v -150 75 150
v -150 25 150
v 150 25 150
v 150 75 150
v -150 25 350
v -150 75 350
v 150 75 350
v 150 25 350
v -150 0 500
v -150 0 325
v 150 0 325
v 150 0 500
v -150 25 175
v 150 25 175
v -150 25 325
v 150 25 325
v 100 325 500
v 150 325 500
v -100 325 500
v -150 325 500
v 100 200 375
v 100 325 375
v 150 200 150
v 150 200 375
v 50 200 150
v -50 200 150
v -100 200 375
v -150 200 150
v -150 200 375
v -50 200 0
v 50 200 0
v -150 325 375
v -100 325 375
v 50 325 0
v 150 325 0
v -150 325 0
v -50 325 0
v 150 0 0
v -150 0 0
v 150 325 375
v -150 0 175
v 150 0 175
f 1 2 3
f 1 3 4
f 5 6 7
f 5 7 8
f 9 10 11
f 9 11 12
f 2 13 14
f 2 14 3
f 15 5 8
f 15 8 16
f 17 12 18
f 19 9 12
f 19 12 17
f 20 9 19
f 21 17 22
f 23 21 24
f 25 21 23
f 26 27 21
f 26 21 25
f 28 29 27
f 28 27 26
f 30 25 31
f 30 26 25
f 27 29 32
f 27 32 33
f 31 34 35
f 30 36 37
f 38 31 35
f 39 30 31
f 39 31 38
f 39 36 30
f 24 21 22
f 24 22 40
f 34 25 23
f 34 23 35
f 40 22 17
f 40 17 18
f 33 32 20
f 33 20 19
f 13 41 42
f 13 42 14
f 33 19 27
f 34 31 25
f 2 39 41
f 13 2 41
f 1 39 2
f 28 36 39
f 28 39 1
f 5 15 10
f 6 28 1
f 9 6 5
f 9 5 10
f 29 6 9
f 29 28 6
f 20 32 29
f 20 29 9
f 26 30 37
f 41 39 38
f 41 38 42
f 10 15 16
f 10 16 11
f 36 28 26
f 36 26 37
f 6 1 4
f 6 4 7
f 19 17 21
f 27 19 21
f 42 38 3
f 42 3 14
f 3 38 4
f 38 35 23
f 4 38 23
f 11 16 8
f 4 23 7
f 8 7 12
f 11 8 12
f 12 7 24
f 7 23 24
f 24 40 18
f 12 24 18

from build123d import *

# Parameters (mm, degrees)
BOSS_EXTRUDE1_DEPTH      = 150
BOSS_EXTRUDE1_DEPTH_BACK = 150
SKETCH3_W                = 50
SKETCH3_H                = 125
BOSS_EXTRUDE2_DEPTH      = 125
SKETCH4_W                = 100
SKETCH4_H                = 125
CUT_EXTRUDE1_DEPTH       = 230


with BuildPart() as part:
    # Sketch1 → Boss-Extrude1 (new, two sides: drawn at the far end of the back side and taken through both)
    with BuildSketch(Plane(origin=(0, 0, 0), x_dir=(0, 0, -1), z_dir=(1, 0, 0)).offset(-BOSS_EXTRUDE1_DEPTH_BACK)):
        Polygon((0, 0), (-175, 0), (-175, 25), (-150, 25), (-150, 75), (-350, 75), (-350, 25), (-325, 25), (-325, 0), (-500, 0), (-500, 325), (-375, 200), (-150, 200), (0, 325), align=None)
    extrude(amount=BOSS_EXTRUDE1_DEPTH + BOSS_EXTRUDE1_DEPTH_BACK)

    # Sketch3 → Boss-Extrude2 (add)
    with BuildSketch(Plane(origin=(0, 200, 0), x_dir=(1, 0, 0), z_dir=(0, 1, 0))):
        with Locations((125, -437.5)):
            Rectangle(SKETCH3_W, SKETCH3_H)
        with Locations((-125, -437.5)):
            Rectangle(SKETCH3_W, SKETCH3_H)
    extrude(amount=BOSS_EXTRUDE2_DEPTH)

    # Sketch4 → Cut-Extrude1 (cut)
    with BuildSketch(Plane(origin=(0, 0, 0), x_dir=(-1, 0, 0), z_dir=(0, 0, -1))):
        with Locations((0, 262.5)):
            Rectangle(SKETCH4_W, SKETCH4_H)
    extrude(amount=-CUT_EXTRUDE1_DEPTH, mode=Mode.SUBTRACT)


solid = part.part
